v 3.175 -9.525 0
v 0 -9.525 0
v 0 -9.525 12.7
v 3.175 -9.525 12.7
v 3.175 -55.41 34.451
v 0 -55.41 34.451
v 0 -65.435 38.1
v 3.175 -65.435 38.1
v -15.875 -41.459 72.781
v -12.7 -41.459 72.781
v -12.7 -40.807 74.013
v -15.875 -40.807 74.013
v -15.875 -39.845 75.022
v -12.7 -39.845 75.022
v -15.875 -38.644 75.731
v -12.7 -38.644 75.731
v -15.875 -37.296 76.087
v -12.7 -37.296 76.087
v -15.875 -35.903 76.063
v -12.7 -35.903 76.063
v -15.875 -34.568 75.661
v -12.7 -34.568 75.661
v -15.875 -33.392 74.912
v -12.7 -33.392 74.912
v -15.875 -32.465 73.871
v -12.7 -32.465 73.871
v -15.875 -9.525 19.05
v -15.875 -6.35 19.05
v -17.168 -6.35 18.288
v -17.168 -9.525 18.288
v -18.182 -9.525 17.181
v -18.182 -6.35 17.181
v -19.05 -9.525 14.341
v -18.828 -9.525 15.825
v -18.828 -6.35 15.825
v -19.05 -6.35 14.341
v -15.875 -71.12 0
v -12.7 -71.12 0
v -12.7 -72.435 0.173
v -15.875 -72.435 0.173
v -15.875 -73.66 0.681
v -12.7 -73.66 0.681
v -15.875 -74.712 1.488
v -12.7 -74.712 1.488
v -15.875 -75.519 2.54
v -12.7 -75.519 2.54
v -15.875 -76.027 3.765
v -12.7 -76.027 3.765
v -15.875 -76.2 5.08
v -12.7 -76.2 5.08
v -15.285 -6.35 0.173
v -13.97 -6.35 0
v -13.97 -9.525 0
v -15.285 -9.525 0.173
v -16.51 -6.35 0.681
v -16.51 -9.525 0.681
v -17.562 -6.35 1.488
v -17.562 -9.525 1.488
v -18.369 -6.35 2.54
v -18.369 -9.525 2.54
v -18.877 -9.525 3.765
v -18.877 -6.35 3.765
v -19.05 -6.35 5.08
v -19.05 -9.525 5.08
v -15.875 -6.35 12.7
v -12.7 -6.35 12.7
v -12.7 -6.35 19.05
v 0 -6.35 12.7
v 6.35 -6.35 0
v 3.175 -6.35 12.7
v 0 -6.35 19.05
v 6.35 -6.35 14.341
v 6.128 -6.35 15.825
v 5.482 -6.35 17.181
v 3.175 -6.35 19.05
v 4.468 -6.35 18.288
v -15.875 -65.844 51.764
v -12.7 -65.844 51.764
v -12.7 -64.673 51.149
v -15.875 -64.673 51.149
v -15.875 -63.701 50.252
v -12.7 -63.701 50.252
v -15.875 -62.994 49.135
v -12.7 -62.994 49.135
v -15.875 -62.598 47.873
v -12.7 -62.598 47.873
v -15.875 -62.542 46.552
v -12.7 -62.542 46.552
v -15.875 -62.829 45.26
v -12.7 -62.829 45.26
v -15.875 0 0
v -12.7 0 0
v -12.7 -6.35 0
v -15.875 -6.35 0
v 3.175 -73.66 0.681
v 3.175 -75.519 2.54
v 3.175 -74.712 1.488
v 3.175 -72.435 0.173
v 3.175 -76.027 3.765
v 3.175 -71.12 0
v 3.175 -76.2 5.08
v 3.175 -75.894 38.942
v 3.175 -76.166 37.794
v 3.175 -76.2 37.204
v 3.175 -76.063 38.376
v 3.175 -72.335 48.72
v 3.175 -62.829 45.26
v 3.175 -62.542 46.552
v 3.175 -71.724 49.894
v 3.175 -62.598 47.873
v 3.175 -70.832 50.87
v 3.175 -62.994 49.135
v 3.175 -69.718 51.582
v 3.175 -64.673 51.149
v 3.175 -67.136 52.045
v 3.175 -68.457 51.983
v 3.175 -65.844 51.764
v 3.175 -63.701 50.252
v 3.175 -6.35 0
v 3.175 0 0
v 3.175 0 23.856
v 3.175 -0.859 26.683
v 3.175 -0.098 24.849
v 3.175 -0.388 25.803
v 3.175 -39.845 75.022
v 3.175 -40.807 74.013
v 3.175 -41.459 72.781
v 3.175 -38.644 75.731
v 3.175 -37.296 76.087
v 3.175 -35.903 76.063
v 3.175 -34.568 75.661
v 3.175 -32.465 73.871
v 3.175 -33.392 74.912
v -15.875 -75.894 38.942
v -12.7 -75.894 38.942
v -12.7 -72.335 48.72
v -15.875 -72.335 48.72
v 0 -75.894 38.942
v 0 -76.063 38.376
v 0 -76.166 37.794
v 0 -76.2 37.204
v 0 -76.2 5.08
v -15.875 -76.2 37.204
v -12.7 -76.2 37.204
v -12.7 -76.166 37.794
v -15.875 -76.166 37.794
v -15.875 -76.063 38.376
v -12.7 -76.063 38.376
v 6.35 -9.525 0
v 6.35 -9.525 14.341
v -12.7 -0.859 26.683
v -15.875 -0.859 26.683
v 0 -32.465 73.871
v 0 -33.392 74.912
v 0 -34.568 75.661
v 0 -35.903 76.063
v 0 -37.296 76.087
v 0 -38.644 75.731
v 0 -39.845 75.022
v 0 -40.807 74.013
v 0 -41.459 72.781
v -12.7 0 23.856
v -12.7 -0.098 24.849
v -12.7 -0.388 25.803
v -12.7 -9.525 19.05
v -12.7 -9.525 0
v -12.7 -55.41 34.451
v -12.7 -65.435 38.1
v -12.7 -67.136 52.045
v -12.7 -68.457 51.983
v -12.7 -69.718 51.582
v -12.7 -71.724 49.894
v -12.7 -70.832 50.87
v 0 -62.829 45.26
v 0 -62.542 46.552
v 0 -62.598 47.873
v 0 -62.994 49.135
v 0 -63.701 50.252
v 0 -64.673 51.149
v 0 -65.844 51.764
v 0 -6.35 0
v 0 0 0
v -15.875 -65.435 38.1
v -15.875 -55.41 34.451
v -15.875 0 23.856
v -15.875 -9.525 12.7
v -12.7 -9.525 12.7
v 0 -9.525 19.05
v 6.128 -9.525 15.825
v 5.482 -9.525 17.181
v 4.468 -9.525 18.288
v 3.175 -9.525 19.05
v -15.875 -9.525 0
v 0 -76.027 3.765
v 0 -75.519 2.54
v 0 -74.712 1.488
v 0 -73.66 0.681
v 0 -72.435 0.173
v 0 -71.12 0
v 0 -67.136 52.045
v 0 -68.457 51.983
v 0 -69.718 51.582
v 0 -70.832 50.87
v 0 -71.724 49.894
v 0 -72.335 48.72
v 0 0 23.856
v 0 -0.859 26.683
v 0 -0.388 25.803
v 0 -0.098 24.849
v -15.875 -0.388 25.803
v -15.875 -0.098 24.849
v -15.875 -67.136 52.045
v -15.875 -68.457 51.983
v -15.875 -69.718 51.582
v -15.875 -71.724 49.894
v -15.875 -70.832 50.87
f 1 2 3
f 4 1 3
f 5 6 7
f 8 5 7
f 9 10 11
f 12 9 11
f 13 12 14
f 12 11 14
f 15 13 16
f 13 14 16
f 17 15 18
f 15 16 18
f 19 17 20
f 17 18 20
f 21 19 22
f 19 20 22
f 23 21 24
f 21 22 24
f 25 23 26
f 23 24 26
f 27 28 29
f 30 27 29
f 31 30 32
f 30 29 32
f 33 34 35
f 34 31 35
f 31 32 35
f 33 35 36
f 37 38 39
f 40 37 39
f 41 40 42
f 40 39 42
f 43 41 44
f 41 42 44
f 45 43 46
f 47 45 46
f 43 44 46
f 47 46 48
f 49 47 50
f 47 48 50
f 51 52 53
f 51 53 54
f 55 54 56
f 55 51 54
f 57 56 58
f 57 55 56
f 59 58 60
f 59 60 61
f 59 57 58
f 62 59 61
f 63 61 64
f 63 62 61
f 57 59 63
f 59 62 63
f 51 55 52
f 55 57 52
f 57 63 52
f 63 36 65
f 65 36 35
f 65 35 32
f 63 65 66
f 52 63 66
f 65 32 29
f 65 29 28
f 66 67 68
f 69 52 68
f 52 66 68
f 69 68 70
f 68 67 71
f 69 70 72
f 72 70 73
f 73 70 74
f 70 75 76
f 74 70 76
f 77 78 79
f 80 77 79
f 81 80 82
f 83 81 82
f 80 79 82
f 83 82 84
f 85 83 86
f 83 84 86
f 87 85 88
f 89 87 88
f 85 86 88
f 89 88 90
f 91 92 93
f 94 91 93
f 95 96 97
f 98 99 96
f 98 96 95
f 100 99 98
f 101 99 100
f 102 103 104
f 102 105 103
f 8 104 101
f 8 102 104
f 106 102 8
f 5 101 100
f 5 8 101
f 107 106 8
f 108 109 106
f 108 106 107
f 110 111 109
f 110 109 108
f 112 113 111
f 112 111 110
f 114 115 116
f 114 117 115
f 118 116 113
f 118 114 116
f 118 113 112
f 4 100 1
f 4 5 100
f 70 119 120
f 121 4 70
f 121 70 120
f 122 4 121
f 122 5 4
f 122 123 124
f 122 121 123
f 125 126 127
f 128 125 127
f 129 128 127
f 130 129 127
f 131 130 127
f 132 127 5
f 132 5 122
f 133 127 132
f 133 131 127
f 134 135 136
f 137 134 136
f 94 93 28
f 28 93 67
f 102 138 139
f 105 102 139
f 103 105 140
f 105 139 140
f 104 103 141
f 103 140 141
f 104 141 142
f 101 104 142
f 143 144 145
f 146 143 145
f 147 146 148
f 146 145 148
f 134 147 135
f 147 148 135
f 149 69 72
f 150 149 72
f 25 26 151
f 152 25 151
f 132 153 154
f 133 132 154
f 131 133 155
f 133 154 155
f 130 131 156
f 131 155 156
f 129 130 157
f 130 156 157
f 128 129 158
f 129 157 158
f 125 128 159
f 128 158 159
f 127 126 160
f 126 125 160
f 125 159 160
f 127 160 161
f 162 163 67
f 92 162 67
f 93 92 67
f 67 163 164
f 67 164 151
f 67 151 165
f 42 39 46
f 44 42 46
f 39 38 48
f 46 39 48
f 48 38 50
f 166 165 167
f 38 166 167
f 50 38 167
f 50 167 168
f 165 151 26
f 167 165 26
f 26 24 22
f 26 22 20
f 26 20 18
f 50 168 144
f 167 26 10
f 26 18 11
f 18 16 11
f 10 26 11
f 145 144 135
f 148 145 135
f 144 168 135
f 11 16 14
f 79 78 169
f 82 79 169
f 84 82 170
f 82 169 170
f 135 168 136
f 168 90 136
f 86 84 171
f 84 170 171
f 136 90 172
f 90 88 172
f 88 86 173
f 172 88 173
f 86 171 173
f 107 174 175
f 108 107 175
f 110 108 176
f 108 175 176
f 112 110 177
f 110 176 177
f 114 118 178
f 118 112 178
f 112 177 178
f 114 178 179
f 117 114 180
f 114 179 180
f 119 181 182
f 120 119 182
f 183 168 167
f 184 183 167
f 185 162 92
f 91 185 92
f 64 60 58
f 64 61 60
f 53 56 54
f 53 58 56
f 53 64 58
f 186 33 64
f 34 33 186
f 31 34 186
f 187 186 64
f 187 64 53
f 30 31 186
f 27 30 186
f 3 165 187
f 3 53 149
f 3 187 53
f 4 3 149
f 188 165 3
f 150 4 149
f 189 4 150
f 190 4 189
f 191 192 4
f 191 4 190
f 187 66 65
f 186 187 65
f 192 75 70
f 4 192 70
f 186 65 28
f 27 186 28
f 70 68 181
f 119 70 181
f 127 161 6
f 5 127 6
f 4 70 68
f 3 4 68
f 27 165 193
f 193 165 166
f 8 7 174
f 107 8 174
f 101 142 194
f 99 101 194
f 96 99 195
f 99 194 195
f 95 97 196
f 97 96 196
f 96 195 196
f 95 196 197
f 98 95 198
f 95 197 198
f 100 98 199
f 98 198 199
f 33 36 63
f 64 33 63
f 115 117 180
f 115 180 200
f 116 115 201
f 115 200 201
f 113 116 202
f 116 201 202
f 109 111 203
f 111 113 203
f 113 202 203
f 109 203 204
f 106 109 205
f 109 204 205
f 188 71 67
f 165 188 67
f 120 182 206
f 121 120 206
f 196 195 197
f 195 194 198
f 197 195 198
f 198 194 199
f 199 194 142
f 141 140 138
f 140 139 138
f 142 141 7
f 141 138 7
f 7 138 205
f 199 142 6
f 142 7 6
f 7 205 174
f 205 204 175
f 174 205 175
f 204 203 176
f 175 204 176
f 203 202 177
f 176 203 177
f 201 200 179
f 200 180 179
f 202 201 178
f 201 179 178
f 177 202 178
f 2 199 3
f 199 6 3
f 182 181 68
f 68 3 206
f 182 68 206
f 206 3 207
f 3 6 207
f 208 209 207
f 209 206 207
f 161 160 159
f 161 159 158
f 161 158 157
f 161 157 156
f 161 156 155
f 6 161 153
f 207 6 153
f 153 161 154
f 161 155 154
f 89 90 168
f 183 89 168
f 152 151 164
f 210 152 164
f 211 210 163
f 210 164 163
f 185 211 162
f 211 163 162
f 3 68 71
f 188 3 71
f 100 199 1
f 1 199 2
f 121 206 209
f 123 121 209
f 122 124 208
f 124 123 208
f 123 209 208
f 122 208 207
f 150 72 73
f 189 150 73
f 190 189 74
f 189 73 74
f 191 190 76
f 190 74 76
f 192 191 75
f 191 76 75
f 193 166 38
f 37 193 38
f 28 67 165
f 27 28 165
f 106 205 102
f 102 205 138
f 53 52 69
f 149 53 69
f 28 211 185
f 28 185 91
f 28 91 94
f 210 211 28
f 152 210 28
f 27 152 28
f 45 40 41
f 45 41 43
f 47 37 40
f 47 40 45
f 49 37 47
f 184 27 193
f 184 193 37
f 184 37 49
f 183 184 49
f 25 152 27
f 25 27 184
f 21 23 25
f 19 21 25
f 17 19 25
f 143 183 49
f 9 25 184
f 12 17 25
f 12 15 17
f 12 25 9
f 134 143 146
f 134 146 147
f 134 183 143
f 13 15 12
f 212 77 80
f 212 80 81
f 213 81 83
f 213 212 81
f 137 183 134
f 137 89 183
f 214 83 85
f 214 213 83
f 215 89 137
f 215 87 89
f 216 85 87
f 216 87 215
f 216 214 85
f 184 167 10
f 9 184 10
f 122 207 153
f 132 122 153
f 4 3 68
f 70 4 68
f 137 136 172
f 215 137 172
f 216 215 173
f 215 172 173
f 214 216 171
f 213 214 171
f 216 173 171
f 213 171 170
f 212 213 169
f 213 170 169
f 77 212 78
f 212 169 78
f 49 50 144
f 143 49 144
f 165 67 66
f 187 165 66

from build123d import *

# Parameters (mm, degrees)
F1_DEPTH      = 3.175
F3_DEPTH      = 3.175
F4_T1_DEPTH   = 7.65370531
F4_T3_DEPTH   = 28.575
F4_T5_DEPTH   = 53.2264881201
F4_T7_DEPTH   = 10.8953858615
F4_2_T1_DEPTH = 26.7214301965
F4_2_T3_DEPTH = 28.575
F6_DEPTH      = 3.175


# Not quite as in the source:
# - a fillet or chamfer that OpenCascade refuses, or shapes differently, is made with other operations: its cross-section is extruded or revolved along the edge and cut away or added


with BuildPart() as f1:
    # F0 (on Right) → F1 (new body)
    with BuildSketch(Plane.YZ):
        Polygon((-6.35, 0), (0, 0), (0, 25.4), (-38.0354831527, 82.1877142469), (-55.4101064336, 34.451329111), (-65.4347473122, 38.1), (-61.0910914919, 50.034096284), (-70.597048836, 53.4939818054), (-76.2, 38.1), (-76.2, 0), (-9.525, 0), (-9.525, 12.7), (-6.35, 12.7), align=None)
    extrude(amount=F1_DEPTH)

    # F4: fillet of radius 5.08 on 6 edges, made by hand

    # F4_s2 → F4_t1 (cut)
    with BuildSketch(Plane.YZ.offset(-2.239352655)):
        with BuildLine():
            ThreePointArc((-75.8936385136, 38.9417212661), (-76.1228233853, 38.0863916805), (-76.2, 37.204258938))
            Line((-76.2, 37.204258938), (-76.2, 38.1))
            Line((-76.2, 38.1), (-75.8936385136, 38.9417212661))
        make_face()
    extrude(amount=F4_T1_DEPTH, mode=Mode.SUBTRACT)

    # F4_s4 → F4_t3 (cut)
    with BuildSketch(Plane.YZ.offset(-12.7)):
        with BuildLine():
            ThreePointArc((-65.8234103224, 51.7565194773), (-69.7077734201, 51.5869245219), (-72.3345111641, 48.7203432918))
            Line((-72.3345111641, 48.7203432918), (-70.597048836, 53.4939818054))
            Line((-70.597048836, 53.4939818054), (-65.8234103224, 51.7565194773))
        make_face()
        with BuildLine():
            ThreePointArc((-62.82855382, 45.2604577704), (-62.9981487755, 49.1448208681), (-65.8647300055, 51.7715586121))
            Line((-65.8647300055, 51.7715586121), (-61.0910914919, 50.034096284))
            Line((-61.0910914919, 50.034096284), (-62.82855382, 45.2604577704))
        make_face()
        with BuildLine():
            ThreePointArc((-76.2, 5.08), (-74.7121024484, 1.4878975516), (-71.12, 0))
            Line((-71.12, 0), (-76.2, 0))
            Line((-76.2, 0), (-76.2, 5.08))
        make_face()
    extrude(amount=F4_T3_DEPTH, mode=Mode.SUBTRACT)

    # F4_s6 → F4_t5 (cut)
    with BuildSketch(Plane.YZ.offset(-25.0257440601)):
        with BuildLine():
            ThreePointArc((-32.4648343865, 73.8706275668), (-37.2964586363, 76.0867843163), (-41.4592065808, 72.7811114378))
            Line((-41.4592065808, 72.7811114378), (-38.0354831527, 82.1877142469))
            Line((-38.0354831527, 82.1877142469), (-32.4648343865, 73.8706275668))
        make_face()
    extrude(amount=F4_T5_DEPTH, mode=Mode.SUBTRACT)

    # F4_s8 → F4_t7 (cut)
    with BuildSketch(Plane.YZ.offset(-3.8601929308)):
        with BuildLine():
            ThreePointArc((0, 23.8559228277), (-0.2195613831, 25.3332638347), (-0.8592663193, 26.6829012848))
            Line((-0.8592663193, 26.6829012848), (0, 25.4))
            Line((0, 25.4), (0, 23.8559228277))
        make_face()
    extrude(amount=F4_T7_DEPTH, mode=Mode.SUBTRACT)


with BuildPart() as f3:
    # F2 (on face) → F3 (new body)
    with BuildSketch(Plane.XZ.offset(6.35)):
        Polygon((3.175, 19.05), (3.175, 12.7), (0, 12.7), (0, 19.05), (-12.7, 19.05), (-12.7, 12.7), (-15.875, 12.7), (-15.875, 19.05), (-19.05, 19.05), (-19.05, 0), (6.35, 0), (6.35, 19.05), align=None)
    extrude(amount=F3_DEPTH)

    # F4#2: fillet of radius 5.08 on 3 edges, made by hand

    # F4_2_s2 → F4_2_t1 (cut)
    with BuildSketch(Plane.XZ.offset(-5.4232150983)):
        with BuildLine():
            ThreePointArc((6.35, 14.3407139607), (5.4821134838, 17.1805202921), (3.175, 19.05))
            Line((3.175, 19.05), (6.35, 19.05))
            Line((6.35, 19.05), (6.35, 14.3407139607))
        make_face()
        with BuildLine():
            ThreePointArc((-15.875, 19.05), (-18.1821134838, 17.1805202921), (-19.05, 14.3407139607))
            Line((-19.05, 14.3407139607), (-19.05, 19.05))
            Line((-19.05, 19.05), (-15.875, 19.05))
        make_face()
    extrude(amount=F4_2_T1_DEPTH, mode=Mode.SUBTRACT)

    # F4_2_s4 → F4_2_t3 (cut)
    with BuildSketch(Plane.XZ.offset(-6.35)):
        with BuildLine():
            ThreePointArc((-13.97, 0), (-17.5621024484, 1.4878975516), (-19.05, 5.08))
            Line((-19.05, 5.08), (-19.05, 0))
            Line((-19.05, 0), (-13.97, 0))
        make_face()
    extrude(amount=F4_2_T3_DEPTH, mode=Mode.SUBTRACT)


with BuildPart() as f6:
    # F5 (on face) → F6 (new body)
    with BuildSketch(Plane(origin=(-12.7, 0, 0), x_dir=(0, -1, 0), z_dir=(-1, 0, 0))):
        with BuildLine():
            Line((75.8936385136, 38.9417212661), (72.3345111641, 48.7203432918))
            ThreePointArc((72.3345111641, 48.7203432918), (69.7177313424, 51.5822679428), (65.844086436, 51.7639943376))
            ThreePointArc((65.844086436, 51.7639943376), (62.9935137558, 49.1348528926), (62.82855382, 45.2604577704))
            Line((62.82855382, 45.2604577704), (65.4347473122, 38.1))
            Line((65.4347473122, 38.1), (55.4101064336, 34.451329111))
            Line((55.4101064336, 34.451329111), (41.4592065808, 72.7811114378))
            ThreePointArc((41.4592065808, 72.7811114378), (37.2964586363, 76.0867843163), (32.4648343865, 73.8706275668))
            Line((32.4648343865, 73.8706275668), (0.8592663193, 26.6829012848))
            ThreePointArc((0.8592663193, 26.6829012848), (0.2195613831, 25.3332638347), (0, 23.8559228277))
            Line((0, 23.8559228277), (0, 0))
            Line((0, 0), (6.35, 0))
            Line((6.35, 0), (6.35, 12.7))
            Line((6.35, 12.7), (6.35, 19.05))
            Line((6.35, 19.05), (9.525, 19.05))
            Line((9.525, 19.05), (9.525, 12.7))
            Line((9.525, 12.7), (9.525, 0))
            Line((9.525, 0), (71.12, 0))
            ThreePointArc((71.12, 0), (74.7121024484, 1.4878975516), (76.2, 5.08))
            Line((76.2, 5.08), (76.2, 37.204258938))
            ThreePointArc((76.2, 37.204258938), (76.1228233853, 38.0863916805), (75.8936385136, 38.9417212661))
        make_face()
    extrude(amount=F6_DEPTH)


solid = Compound([f1.part, f3.part, f6.part])
